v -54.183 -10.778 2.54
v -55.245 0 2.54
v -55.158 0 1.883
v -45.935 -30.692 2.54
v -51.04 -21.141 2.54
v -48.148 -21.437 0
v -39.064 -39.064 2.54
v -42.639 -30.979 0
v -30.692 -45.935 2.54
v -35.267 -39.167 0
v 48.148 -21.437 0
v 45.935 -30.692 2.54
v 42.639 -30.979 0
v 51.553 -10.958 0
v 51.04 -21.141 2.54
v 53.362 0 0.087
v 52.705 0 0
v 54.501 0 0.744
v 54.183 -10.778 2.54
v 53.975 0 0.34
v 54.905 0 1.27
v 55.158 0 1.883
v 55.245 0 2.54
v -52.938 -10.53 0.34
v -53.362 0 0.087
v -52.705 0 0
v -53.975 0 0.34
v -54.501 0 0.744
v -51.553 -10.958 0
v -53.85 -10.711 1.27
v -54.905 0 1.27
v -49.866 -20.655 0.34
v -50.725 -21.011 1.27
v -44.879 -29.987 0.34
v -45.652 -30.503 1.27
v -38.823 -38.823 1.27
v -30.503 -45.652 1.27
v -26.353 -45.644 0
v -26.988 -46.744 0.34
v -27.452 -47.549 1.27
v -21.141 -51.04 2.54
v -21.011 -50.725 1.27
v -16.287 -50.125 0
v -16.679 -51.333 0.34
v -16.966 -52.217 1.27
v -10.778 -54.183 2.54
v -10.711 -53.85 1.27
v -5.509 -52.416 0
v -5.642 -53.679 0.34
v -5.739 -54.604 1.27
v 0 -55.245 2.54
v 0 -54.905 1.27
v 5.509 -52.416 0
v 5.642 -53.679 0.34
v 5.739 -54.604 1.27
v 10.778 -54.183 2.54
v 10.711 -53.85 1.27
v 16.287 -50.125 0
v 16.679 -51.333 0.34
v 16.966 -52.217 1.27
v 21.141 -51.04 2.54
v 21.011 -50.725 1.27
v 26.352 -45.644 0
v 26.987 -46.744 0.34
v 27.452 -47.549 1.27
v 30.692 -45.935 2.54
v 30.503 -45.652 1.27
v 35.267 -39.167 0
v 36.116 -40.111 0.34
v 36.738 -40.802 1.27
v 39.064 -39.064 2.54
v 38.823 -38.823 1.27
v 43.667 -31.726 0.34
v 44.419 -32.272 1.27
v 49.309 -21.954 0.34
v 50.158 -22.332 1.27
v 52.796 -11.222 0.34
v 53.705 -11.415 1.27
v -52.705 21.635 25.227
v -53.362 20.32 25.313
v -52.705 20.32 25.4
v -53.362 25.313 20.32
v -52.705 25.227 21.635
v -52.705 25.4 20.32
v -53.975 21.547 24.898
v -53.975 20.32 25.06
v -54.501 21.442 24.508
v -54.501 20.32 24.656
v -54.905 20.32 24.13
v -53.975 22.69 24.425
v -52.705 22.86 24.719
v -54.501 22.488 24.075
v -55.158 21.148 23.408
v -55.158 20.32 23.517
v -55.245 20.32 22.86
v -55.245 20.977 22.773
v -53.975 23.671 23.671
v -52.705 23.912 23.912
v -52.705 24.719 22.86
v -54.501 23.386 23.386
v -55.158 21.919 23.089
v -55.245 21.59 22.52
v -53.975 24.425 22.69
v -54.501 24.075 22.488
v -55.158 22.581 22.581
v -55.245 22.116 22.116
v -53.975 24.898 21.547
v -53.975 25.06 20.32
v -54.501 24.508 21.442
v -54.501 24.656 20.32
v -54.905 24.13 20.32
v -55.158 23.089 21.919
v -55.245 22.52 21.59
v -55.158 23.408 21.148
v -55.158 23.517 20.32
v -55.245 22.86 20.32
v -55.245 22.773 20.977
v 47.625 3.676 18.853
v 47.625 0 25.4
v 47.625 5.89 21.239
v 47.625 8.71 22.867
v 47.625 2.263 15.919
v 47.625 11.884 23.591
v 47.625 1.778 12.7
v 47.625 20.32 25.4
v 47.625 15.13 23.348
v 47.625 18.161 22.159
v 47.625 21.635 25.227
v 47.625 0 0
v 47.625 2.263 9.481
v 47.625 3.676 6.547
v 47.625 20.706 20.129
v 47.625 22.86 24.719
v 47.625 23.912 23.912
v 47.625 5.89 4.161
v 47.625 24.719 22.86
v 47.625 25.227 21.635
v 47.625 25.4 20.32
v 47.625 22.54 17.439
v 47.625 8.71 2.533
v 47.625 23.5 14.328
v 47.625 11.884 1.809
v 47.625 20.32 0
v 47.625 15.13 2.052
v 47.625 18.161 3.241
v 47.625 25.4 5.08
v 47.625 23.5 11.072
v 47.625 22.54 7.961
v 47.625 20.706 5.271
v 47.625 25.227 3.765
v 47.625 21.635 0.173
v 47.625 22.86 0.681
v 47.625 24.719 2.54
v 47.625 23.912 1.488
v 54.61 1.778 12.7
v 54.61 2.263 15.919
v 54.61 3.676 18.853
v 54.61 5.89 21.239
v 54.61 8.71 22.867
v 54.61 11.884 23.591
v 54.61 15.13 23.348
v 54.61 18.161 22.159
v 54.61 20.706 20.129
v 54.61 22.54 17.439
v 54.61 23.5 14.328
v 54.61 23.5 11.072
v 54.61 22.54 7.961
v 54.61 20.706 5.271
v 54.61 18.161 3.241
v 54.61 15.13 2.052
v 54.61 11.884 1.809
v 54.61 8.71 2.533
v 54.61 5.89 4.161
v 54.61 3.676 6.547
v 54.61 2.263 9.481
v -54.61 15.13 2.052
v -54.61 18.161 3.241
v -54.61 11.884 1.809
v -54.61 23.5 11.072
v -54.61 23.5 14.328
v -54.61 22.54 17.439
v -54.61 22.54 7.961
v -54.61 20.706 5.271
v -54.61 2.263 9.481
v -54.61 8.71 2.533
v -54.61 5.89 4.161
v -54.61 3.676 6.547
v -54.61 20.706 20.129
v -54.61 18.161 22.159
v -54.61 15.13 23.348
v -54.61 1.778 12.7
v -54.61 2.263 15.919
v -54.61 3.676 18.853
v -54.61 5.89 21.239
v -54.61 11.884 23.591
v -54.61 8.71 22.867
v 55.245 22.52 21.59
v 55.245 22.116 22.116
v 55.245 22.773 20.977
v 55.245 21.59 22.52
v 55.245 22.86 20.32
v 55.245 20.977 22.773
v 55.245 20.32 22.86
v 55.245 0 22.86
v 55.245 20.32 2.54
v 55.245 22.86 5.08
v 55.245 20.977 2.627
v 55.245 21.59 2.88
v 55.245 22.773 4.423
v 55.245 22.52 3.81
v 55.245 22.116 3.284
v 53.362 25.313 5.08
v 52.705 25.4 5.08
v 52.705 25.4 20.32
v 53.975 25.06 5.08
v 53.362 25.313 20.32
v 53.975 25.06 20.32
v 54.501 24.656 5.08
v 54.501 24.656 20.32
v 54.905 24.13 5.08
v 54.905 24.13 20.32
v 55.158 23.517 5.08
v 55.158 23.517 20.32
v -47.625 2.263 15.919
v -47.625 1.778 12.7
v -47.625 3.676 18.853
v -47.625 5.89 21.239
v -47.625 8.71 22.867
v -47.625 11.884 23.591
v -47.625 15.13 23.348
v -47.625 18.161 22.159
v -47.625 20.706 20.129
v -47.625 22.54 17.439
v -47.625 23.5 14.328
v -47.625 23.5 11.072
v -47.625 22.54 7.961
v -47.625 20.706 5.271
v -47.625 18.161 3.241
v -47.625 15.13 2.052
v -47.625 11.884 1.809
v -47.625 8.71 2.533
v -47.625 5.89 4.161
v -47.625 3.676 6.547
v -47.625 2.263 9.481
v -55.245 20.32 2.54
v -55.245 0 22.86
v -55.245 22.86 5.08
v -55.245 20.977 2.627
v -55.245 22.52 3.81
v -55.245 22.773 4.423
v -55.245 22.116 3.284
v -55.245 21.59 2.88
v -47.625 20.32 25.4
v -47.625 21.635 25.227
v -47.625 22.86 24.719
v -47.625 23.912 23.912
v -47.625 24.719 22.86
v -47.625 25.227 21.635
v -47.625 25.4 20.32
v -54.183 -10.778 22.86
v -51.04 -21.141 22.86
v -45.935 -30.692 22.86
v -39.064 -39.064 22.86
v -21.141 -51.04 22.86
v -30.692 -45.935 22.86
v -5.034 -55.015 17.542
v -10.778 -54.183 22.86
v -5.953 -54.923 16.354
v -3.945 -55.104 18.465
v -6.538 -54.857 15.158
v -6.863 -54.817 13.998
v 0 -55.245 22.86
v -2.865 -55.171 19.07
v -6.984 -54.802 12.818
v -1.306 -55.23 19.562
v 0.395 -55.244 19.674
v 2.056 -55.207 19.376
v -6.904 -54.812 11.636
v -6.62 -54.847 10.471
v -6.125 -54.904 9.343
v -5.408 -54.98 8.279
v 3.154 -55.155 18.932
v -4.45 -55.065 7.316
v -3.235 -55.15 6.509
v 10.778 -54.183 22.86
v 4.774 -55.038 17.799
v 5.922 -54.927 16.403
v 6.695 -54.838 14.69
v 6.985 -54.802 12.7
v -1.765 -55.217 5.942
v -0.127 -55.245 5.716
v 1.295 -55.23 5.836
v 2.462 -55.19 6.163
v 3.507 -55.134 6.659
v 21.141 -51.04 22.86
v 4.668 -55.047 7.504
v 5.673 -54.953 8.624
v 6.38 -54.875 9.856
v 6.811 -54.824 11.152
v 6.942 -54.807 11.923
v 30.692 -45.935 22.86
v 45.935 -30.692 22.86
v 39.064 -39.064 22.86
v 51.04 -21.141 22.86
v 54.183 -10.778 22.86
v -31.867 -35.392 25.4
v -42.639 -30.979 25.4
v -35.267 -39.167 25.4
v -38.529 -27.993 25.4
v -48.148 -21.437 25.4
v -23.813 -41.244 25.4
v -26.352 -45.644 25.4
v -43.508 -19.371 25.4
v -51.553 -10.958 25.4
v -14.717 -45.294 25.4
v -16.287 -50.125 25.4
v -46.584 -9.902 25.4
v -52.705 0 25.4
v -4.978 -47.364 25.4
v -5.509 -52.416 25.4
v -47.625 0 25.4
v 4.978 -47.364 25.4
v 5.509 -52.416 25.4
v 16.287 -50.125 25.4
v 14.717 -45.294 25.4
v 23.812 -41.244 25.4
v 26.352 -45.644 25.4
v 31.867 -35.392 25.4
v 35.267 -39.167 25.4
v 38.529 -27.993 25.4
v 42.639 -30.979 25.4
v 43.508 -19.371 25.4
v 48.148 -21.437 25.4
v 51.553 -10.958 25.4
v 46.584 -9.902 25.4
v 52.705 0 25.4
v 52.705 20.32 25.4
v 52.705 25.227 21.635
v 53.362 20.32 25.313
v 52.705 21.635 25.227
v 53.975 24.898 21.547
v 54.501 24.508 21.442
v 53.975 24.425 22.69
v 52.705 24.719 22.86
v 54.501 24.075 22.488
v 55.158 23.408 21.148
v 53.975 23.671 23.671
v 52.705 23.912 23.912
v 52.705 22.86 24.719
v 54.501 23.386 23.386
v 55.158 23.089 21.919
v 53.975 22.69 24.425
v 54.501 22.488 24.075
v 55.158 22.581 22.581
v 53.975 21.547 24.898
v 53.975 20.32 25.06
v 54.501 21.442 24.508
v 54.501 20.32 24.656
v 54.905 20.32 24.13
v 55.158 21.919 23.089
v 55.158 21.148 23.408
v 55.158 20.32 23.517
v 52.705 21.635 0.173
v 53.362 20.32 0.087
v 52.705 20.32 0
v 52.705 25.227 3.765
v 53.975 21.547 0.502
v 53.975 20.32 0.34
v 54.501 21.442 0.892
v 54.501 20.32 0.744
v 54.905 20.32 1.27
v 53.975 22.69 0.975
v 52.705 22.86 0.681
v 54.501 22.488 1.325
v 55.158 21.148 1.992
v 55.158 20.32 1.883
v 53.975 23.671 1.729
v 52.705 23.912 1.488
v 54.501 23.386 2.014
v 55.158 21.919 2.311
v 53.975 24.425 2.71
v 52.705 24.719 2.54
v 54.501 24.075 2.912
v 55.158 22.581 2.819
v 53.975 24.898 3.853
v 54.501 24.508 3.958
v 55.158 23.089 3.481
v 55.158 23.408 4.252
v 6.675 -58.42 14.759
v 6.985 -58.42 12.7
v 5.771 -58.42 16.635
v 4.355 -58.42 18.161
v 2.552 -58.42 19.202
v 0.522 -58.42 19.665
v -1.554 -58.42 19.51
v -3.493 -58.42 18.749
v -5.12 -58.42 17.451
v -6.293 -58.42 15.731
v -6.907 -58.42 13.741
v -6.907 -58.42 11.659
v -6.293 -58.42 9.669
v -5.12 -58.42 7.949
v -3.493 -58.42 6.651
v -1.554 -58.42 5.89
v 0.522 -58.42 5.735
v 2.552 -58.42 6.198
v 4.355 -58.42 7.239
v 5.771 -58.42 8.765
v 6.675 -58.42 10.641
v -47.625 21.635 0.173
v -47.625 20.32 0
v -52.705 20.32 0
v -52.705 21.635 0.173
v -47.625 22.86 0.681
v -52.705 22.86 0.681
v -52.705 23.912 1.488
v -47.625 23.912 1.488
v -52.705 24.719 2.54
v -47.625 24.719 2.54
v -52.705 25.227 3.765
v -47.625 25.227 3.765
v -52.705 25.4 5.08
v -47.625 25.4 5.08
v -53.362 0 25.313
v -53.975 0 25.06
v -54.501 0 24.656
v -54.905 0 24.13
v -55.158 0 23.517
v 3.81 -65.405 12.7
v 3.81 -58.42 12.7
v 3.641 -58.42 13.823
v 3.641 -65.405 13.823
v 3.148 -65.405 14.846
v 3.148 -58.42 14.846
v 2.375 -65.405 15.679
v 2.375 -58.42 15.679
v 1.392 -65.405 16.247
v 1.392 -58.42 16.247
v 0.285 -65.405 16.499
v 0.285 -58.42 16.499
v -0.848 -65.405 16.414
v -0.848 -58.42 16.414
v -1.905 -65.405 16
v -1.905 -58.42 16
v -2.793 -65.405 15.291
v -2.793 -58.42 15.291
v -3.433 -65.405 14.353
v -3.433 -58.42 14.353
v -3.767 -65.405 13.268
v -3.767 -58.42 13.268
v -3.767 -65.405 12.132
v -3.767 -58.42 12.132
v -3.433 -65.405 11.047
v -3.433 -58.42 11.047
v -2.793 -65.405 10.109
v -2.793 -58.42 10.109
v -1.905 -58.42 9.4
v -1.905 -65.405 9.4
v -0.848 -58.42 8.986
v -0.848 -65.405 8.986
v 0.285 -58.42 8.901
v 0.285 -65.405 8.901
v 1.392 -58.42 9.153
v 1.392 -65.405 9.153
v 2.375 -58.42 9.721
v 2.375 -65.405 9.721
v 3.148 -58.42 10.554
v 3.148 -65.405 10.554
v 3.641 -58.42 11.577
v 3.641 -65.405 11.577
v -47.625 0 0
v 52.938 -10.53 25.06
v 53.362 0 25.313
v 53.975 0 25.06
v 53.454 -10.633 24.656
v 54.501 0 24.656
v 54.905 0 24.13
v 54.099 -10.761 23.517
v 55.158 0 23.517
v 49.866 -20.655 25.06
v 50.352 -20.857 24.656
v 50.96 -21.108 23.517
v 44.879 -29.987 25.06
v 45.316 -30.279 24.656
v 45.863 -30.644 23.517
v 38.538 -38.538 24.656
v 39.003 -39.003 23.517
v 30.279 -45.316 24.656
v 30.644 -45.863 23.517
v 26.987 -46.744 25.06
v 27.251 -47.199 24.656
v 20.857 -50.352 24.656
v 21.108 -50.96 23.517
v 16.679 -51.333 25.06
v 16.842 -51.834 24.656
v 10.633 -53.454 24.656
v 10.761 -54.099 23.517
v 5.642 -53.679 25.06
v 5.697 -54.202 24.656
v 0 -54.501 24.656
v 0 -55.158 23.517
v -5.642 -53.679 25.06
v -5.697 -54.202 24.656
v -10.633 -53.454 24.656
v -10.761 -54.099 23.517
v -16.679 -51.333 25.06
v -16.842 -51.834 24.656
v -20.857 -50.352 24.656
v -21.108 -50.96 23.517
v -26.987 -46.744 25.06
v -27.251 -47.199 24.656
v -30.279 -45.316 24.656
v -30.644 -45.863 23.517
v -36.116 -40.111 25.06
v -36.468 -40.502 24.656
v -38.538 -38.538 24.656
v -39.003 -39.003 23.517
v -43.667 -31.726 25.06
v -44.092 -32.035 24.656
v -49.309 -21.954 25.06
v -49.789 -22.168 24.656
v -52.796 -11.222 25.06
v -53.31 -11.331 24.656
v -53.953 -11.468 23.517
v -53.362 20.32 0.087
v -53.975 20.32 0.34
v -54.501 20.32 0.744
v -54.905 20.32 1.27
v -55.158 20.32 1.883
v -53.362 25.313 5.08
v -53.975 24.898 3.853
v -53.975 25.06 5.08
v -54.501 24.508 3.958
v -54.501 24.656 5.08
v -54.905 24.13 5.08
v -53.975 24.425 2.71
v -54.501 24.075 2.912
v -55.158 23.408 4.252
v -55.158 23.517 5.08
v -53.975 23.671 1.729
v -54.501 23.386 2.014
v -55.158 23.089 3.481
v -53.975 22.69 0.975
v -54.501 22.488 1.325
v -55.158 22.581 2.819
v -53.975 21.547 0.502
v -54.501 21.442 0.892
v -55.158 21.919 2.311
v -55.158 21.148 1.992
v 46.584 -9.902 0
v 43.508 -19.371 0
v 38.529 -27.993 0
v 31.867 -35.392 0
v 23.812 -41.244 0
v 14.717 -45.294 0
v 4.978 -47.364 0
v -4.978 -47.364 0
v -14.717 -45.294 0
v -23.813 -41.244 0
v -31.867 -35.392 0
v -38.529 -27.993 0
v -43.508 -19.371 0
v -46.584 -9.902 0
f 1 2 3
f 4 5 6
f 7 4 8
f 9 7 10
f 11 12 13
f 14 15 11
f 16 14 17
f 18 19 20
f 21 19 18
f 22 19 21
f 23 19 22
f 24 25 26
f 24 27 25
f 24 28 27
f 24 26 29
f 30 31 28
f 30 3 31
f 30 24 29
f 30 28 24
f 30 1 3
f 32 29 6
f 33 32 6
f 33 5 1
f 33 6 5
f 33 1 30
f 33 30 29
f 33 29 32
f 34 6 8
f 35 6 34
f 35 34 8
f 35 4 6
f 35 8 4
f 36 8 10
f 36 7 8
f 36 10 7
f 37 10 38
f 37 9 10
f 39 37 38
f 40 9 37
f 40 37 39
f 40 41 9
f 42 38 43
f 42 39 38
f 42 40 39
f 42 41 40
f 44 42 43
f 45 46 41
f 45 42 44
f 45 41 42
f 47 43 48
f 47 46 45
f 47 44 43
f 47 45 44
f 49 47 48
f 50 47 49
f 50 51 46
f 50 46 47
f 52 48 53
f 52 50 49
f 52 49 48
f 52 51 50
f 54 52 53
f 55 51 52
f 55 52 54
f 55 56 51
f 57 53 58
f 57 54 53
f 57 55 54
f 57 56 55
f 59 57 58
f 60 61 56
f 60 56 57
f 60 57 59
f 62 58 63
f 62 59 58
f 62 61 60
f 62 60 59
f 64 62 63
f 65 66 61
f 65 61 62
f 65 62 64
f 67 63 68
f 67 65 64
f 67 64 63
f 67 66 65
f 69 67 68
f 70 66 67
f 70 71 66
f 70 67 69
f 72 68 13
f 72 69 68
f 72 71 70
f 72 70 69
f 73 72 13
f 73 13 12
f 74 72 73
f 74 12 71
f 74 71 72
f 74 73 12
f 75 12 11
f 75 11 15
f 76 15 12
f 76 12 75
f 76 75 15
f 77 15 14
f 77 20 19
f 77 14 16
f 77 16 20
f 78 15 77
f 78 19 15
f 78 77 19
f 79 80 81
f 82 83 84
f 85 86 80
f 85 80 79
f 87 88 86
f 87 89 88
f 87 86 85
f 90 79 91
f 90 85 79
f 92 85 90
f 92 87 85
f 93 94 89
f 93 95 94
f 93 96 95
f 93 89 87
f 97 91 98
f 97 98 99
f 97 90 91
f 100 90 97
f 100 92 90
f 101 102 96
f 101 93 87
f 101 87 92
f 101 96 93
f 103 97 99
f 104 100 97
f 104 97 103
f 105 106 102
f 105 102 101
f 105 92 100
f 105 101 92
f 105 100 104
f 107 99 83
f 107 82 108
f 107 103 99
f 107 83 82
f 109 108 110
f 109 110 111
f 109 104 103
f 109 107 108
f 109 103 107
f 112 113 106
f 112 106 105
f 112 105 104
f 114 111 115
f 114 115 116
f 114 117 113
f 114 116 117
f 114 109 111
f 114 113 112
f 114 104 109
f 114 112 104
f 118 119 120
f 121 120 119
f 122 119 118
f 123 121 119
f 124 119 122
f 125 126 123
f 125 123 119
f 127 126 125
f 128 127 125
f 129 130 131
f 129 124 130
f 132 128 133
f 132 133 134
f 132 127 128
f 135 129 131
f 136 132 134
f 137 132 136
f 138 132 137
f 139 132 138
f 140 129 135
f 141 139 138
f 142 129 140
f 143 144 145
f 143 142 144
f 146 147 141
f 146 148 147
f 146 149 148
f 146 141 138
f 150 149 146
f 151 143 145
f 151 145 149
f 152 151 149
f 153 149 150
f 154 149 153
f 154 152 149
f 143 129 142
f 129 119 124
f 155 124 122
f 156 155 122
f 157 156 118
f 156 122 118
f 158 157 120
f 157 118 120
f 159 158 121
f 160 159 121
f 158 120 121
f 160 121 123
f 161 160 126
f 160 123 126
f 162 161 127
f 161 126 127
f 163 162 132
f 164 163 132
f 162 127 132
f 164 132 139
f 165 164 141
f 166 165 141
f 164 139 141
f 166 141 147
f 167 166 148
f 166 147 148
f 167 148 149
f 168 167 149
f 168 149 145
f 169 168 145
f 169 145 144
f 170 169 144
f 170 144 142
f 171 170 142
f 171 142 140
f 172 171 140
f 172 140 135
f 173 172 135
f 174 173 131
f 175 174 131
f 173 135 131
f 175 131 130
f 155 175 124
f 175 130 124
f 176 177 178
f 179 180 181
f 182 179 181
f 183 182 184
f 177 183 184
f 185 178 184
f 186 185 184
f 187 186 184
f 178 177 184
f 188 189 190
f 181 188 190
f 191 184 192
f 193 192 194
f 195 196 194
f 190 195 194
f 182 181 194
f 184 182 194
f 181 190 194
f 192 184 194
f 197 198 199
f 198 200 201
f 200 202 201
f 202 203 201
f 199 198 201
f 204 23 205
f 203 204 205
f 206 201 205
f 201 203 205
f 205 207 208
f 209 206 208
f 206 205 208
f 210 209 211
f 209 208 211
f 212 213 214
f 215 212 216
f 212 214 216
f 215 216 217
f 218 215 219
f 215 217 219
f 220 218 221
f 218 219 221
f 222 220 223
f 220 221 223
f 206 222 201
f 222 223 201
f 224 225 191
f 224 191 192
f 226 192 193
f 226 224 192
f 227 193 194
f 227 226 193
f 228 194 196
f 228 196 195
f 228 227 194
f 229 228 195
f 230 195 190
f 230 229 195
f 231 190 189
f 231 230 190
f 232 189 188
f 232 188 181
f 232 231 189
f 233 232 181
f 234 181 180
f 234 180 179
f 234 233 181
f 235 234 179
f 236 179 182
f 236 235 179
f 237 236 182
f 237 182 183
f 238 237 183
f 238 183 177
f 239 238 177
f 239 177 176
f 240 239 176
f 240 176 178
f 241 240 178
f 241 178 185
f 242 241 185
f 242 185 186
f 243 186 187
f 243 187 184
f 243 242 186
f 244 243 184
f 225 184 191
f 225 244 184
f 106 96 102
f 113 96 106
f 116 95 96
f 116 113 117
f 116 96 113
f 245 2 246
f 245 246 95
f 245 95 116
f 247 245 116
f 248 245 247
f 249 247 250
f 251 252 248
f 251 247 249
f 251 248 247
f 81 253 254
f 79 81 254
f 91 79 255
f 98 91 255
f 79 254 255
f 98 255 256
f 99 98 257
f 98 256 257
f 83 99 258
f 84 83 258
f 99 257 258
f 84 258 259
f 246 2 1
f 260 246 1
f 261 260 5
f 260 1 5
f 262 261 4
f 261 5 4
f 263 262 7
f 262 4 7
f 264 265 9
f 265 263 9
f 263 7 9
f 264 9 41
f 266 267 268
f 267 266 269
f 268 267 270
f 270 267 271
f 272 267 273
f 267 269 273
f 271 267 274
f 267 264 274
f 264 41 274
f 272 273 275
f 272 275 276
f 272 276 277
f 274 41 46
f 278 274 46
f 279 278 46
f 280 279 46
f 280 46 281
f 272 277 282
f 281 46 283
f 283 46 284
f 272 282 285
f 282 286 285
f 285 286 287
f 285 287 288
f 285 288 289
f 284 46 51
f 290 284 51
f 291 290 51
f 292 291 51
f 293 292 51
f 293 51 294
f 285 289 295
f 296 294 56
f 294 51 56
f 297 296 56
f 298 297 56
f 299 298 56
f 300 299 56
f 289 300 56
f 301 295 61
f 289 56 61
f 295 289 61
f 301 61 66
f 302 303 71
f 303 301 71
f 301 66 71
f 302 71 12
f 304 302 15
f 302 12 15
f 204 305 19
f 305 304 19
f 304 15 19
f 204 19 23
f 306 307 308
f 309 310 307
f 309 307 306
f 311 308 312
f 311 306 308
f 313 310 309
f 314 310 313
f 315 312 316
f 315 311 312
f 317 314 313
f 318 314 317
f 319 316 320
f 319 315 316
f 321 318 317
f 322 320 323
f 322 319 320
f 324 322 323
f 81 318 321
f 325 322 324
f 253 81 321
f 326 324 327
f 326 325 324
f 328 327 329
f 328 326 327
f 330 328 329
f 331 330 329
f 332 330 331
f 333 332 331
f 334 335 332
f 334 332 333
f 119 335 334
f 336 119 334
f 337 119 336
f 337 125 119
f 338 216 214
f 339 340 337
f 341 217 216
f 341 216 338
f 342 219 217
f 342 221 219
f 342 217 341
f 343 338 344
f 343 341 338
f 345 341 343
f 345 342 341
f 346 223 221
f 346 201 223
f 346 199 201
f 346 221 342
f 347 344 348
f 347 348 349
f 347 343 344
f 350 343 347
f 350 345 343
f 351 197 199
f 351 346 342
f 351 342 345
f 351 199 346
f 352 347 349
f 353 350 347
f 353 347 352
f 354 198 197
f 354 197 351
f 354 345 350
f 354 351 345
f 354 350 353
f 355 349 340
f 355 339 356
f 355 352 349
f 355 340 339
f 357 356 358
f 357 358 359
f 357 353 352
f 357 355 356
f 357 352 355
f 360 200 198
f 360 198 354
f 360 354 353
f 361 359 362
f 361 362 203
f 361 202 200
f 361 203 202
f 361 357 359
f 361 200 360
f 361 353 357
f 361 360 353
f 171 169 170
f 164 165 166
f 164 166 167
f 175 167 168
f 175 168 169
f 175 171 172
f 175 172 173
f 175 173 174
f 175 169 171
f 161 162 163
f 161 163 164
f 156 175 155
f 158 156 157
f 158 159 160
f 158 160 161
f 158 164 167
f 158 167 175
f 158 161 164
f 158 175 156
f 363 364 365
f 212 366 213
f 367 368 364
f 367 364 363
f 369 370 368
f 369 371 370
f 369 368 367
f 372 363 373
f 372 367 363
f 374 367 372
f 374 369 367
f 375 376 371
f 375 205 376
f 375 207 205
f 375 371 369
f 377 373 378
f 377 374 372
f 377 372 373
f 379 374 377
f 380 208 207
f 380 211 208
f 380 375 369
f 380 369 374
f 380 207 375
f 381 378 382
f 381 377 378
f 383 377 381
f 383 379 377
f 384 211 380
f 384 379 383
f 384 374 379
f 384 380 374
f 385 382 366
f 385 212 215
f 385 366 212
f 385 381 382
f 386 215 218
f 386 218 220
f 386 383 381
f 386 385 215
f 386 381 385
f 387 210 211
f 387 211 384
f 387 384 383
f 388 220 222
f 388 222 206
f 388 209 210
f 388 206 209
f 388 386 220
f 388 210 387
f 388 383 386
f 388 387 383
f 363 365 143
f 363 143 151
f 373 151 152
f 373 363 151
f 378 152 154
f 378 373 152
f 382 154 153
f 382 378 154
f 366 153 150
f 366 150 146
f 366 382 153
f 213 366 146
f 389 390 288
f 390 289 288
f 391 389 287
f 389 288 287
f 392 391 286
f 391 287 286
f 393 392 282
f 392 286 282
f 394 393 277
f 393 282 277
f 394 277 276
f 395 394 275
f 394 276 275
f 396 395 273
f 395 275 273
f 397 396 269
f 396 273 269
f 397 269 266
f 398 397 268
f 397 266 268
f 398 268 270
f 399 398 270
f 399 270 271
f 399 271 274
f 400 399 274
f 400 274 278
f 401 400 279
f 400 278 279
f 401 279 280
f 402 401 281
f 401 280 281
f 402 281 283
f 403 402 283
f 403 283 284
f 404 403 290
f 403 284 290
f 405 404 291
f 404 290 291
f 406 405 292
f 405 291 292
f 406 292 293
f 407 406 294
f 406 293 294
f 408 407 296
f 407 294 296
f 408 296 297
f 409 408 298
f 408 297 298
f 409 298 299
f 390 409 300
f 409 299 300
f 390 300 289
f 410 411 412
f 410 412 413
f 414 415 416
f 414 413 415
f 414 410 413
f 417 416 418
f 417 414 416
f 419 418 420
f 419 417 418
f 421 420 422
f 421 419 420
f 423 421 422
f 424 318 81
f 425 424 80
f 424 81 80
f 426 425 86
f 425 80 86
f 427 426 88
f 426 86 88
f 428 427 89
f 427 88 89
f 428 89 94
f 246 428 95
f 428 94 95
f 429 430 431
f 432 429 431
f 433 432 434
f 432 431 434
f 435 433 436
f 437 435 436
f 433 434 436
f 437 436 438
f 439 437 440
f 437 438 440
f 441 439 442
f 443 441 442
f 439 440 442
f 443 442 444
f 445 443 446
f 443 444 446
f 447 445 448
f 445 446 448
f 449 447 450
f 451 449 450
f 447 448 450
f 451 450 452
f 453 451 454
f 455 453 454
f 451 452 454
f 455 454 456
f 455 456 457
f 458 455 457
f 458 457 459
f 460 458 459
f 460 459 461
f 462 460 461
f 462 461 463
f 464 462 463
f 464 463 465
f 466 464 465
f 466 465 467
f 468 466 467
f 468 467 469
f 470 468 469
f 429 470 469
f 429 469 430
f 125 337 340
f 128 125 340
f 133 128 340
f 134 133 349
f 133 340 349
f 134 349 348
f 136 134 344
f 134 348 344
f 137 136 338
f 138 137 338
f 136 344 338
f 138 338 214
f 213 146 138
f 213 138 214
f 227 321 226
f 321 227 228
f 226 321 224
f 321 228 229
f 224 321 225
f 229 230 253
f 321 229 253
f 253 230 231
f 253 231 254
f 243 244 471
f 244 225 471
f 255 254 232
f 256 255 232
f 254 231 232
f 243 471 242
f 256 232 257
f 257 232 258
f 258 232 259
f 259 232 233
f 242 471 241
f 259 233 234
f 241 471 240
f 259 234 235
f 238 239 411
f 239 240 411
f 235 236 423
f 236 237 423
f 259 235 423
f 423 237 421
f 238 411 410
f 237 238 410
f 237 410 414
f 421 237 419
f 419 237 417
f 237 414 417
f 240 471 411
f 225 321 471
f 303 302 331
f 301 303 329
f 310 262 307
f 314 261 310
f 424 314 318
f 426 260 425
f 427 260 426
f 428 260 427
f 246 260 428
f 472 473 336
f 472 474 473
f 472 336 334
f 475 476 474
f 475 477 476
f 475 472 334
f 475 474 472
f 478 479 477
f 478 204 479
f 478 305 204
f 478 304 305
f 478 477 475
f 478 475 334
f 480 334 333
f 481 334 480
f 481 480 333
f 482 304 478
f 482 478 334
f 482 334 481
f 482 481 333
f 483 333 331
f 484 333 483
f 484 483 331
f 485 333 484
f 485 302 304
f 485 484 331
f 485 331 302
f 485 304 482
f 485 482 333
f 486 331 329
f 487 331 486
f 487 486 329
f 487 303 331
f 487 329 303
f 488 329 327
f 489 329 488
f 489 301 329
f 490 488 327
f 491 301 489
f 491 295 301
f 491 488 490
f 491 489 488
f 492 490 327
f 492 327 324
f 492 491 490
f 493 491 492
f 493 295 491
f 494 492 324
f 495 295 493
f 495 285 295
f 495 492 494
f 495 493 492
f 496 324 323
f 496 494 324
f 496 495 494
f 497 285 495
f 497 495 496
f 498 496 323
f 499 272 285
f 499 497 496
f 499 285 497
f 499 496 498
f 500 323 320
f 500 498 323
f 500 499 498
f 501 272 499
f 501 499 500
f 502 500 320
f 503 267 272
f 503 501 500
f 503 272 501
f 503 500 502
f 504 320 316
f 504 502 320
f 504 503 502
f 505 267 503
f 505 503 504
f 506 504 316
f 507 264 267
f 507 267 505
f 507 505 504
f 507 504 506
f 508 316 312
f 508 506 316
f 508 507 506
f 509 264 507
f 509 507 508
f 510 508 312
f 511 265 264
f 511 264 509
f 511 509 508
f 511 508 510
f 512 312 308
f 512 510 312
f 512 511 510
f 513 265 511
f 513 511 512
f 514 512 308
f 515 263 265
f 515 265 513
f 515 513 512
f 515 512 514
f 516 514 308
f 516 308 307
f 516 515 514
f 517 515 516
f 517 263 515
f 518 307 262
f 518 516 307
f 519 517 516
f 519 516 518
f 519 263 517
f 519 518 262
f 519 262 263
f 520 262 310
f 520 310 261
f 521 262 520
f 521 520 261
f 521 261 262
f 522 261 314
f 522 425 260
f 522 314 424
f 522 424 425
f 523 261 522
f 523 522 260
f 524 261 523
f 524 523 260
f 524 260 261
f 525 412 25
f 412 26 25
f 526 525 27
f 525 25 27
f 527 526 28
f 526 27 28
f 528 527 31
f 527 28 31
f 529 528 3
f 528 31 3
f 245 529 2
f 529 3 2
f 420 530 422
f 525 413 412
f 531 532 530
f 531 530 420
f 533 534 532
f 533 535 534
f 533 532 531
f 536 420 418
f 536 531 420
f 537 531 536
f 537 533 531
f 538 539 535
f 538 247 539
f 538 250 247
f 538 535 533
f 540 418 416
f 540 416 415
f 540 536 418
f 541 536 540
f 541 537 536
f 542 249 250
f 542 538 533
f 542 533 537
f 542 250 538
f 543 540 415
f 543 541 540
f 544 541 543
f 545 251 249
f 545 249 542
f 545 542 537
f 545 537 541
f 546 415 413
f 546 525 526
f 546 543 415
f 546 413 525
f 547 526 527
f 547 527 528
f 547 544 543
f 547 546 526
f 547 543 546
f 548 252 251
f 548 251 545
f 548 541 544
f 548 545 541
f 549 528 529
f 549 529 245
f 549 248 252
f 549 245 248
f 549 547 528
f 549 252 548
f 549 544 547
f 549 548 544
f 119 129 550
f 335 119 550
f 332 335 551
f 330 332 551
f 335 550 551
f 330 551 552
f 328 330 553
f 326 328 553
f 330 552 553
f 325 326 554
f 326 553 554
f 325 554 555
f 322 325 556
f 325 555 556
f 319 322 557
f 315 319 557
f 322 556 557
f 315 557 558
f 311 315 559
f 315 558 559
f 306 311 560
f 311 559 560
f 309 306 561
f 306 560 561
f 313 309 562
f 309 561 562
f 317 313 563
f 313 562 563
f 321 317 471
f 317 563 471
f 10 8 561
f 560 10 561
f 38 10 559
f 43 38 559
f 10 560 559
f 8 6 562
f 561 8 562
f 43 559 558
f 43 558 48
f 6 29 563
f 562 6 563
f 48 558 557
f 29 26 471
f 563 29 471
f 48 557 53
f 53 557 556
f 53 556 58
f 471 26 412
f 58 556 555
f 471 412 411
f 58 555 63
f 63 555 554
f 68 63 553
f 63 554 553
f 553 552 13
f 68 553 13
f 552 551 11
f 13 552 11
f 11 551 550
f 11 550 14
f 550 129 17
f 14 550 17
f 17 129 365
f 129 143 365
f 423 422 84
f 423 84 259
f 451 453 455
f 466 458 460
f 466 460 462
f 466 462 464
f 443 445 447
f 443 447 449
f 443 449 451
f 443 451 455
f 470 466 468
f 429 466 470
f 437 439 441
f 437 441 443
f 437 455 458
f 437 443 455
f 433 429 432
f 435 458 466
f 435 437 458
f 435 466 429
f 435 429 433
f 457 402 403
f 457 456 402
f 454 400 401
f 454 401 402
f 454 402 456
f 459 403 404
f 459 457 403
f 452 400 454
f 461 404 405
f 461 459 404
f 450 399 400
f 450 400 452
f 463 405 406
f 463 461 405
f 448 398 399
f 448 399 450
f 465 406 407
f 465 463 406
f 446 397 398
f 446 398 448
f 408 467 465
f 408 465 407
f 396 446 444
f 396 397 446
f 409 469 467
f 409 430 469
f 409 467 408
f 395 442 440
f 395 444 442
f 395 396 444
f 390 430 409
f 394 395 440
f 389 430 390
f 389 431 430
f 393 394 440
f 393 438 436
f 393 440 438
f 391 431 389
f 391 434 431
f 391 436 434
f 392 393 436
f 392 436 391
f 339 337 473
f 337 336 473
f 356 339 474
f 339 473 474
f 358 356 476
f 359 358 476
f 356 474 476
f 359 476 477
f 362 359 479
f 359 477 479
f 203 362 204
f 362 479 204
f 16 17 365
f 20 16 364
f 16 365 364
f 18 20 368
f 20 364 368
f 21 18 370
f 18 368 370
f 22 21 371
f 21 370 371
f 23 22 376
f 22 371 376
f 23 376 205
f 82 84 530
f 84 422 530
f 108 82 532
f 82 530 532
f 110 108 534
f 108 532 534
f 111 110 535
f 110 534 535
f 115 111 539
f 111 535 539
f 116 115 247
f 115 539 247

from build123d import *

# Parameters (mm, degrees)
F0_W          = 7.62
F0_H          = 25.4
F1_DEPTH      = 25.4
F5_R          = 10.922
F6_DEPTH      = 6.985
F4_R          = 6.985
F4_R_2        = 3.81
F7_DEPTH      = 3.175
F7_DEPTH_BACK = 3.175
F8_DEPTH      = 10.16
F8_DEPTH_BACK = 3.175
F9_R          = 5.08
F10_R         = 2.54


# Not quite as in the source:
# - a pattern or mirror of a feature is missing from the dataset's text; its kind, count and spacing are read off the source's solid


with BuildPart() as f1:
    # F0 (on Top) → F1 (new body)
    with BuildSketch(Plane.XY):
        with BuildLine():
            Line((55.245, 0), (47.625, 0))
            ThreePointArc((47.625, 0), (0, -47.625), (-47.625, 0))
            Line((-47.625, 0), (-55.245, 0))
            ThreePointArc((-55.245, 0), (0, -55.245), (55.245, 0))
        make_face()
        with Locations((51.435, 12.7)):
            Rectangle(F0_W, F0_H)
        with Locations((-51.435, 12.7)):
            Rectangle(F0_W, F0_H)
    extrude(amount=F1_DEPTH)

    # F5 (on face) → F6 (cut)
    with BuildSketch(Plane(origin=(47.625, 0, 0), x_dir=(0, -1, 0), z_dir=(-1, 0, 0))):
        with Locations((-12.7, 12.7)):
            Circle(F5_R)
    f6 = extrude(amount=-F6_DEPTH, mode=Mode.SUBTRACT)

    # F6_copies: F6 across plane
    add(f6.mirror(Plane(origin=(0, 0, 0), x_dir=(0, 0, -1), z_dir=(-1, 0, 0))), mode=Mode.SUBTRACT)

    # F4 (on plane+point) → F7 (join, two sides)
    with BuildSketch(Plane.XZ.offset(55.245)) as f7_sk:
        with Locations((0, 12.7)):
            Circle(F4_R)
        with Locations((0, 12.7)):
            Circle(F4_R_2, mode=Mode.SUBTRACT)
    extrude(amount=F7_DEPTH)
    extrude(f7_sk.sketch, amount=-F7_DEPTH_BACK)

    # F4 (on plane+point) → F8 (join, two sides)
    with BuildSketch(Plane.XZ.offset(55.245)) as f8_sk:
        with Locations((0, 12.7)):
            Circle(F4_R_2)
    extrude(amount=F8_DEPTH)
    extrude(f8_sk.sketch, amount=-F8_DEPTH_BACK)

    # F9
    f9_edges = [f1.edges().sort_by_distance(p)[0] for p in [
        (-51.435, 25.4, 0),
        (-51.435, 25.4, 25.4),
        (51.435, 25.4, 25.4),
        (51.435, 25.4, 0),
    ]]
    fillet(f9_edges, radius=F9_R)

    # F10
    f10_edges = [f1.edges().sort_by_distance(p)[0] for p in [
        (0, -55.245, 0),
        (55.245, 25.4, 12.7),
        (55.245, 23.912102, 1.487898),
        (55.245, 23.912102, 23.912102),
        (-55.245, 10.16, 0),
        (55.245, 10.16, 0),
        (-55.245, 10.16, 25.4),
        (0, -55.245, 25.4),
        (55.245, 10.16, 25.4),
        (-55.245, 23.912102, 1.487898),
        (-55.245, 25.4, 12.7),
        (-55.245, 23.912102, 23.912102),
    ]]
    fillet(f10_edges, radius=F10_R)


solid = f1.part
